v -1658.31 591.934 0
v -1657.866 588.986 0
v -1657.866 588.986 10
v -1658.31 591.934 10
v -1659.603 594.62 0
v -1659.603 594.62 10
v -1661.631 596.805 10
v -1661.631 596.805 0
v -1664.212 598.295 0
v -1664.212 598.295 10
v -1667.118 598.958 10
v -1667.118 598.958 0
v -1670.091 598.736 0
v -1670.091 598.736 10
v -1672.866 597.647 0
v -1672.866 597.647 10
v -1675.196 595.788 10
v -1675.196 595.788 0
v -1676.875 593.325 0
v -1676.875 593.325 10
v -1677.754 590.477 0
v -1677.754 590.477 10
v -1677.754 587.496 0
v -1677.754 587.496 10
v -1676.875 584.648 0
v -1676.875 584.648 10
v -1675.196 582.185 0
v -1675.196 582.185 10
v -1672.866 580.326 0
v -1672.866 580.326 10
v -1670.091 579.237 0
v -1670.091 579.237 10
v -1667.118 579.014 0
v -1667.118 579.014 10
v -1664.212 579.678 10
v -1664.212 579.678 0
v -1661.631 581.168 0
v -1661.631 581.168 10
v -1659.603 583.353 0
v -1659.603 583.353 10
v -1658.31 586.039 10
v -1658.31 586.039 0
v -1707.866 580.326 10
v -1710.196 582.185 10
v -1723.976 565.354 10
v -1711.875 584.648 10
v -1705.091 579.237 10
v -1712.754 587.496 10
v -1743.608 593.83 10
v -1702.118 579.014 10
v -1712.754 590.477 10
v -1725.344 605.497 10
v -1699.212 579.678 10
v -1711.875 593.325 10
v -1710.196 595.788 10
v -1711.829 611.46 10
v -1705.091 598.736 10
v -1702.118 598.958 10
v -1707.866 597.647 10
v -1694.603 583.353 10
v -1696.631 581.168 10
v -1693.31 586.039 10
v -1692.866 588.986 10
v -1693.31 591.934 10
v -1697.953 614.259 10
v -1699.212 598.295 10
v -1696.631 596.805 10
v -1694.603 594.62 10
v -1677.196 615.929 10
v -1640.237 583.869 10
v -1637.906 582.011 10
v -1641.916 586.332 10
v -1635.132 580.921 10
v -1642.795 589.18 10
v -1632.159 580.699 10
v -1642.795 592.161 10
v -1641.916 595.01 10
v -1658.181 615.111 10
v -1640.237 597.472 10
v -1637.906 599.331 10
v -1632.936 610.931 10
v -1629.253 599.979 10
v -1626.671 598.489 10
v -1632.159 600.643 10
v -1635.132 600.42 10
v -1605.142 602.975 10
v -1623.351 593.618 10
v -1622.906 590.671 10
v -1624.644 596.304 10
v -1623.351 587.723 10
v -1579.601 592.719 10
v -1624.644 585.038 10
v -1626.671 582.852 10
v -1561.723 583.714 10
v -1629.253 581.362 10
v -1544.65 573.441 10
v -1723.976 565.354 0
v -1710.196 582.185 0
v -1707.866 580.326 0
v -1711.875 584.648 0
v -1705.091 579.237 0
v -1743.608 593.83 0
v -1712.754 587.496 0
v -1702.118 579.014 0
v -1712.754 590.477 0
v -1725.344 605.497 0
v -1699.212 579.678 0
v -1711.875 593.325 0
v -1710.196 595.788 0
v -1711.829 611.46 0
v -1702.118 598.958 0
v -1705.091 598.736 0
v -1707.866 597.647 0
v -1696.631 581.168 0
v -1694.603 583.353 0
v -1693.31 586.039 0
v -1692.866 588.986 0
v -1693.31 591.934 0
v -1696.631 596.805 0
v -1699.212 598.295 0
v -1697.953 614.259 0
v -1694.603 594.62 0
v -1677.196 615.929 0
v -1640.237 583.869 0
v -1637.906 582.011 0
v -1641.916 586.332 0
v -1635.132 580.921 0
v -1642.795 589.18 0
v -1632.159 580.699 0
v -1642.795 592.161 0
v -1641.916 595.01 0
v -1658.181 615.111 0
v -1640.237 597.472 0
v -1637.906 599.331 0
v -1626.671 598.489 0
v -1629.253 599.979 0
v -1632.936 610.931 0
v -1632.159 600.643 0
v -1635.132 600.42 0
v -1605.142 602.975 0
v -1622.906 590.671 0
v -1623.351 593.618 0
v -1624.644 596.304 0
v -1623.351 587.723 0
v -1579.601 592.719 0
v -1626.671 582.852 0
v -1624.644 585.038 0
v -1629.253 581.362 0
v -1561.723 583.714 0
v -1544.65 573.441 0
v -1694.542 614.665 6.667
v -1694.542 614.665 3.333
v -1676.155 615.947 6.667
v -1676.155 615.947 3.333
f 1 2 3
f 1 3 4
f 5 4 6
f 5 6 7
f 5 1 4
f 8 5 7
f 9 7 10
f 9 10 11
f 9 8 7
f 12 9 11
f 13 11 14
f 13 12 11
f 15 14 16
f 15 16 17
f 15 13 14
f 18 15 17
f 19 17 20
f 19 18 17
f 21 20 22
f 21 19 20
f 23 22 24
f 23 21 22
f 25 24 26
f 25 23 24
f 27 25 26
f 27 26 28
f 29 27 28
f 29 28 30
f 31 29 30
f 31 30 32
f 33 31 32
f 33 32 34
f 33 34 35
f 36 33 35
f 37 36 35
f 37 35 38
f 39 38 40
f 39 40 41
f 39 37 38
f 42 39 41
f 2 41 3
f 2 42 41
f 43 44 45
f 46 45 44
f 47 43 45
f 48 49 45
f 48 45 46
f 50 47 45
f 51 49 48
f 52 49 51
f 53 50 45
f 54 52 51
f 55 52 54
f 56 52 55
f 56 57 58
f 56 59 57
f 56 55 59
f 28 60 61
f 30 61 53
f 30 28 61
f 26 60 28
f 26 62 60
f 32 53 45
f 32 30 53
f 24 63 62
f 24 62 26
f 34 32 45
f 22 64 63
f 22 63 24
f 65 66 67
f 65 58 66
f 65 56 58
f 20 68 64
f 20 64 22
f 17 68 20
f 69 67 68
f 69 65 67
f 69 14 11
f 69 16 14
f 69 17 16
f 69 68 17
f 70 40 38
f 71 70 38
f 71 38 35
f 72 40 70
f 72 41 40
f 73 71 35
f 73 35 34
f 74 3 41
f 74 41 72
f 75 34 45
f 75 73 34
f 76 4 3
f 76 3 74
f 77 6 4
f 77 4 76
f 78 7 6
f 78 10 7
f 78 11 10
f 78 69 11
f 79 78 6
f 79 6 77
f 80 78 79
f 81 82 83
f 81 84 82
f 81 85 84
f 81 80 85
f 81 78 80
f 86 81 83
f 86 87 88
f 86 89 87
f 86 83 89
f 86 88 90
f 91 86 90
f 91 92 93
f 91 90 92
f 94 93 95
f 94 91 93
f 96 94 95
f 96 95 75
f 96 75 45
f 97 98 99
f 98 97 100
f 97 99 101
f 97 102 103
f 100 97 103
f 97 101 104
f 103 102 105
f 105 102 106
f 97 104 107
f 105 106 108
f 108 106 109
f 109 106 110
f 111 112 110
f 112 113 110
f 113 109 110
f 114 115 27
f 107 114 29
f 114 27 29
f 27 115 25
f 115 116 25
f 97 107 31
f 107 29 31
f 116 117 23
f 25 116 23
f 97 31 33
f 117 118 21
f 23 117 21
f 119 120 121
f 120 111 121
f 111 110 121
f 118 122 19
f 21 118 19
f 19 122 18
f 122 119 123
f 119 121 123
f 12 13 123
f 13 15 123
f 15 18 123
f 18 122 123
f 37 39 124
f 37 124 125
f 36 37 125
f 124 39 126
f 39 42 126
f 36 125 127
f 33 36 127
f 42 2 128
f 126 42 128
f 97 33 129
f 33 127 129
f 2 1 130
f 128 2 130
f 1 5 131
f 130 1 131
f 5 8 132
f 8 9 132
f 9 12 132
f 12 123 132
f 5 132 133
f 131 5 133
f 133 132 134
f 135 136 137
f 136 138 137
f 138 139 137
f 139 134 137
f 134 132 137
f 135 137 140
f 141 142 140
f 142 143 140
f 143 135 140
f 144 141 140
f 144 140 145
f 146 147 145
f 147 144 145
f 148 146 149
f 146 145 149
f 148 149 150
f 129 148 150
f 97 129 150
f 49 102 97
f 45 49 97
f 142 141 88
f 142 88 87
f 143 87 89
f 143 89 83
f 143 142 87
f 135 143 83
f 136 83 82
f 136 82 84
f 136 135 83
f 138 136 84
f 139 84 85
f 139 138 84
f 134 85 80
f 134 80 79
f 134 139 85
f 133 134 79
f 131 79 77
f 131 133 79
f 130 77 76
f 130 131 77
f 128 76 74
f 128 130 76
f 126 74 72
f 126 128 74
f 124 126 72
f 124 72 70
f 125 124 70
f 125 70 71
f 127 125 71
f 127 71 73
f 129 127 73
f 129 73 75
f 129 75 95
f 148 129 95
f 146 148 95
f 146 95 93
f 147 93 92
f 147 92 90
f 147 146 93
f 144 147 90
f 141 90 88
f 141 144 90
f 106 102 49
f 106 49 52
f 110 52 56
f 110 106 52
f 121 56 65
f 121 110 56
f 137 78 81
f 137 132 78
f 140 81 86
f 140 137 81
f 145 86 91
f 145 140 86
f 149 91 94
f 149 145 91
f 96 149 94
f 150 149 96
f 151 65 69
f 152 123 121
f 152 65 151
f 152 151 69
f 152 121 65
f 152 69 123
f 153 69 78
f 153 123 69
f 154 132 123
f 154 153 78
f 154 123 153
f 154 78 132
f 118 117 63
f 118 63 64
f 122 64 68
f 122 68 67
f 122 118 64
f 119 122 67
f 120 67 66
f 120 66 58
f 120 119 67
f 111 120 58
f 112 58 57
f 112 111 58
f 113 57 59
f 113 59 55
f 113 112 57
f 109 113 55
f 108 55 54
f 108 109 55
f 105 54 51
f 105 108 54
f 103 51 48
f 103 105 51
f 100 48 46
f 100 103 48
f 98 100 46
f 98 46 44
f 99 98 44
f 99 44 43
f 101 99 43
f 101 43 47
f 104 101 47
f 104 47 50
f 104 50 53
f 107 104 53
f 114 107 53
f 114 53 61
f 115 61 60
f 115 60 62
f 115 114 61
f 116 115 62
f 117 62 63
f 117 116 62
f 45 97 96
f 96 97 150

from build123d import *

# Parameters (mm, degrees)
SKETCH1_R           = 10
BOSS_EXTRUDE1_DEPTH = 10


with BuildPart() as part:
    # Sketch1 → Boss-Extrude1 (new body)
    with BuildSketch(Plane.XY):
        with BuildLine():
            Line((-1743.607960183, 593.830470178), (-1723.97557604, 565.354199265))
            Line((-1723.97557604, 565.354199265), (-1544.649956659, 573.44143308))
            add(Edge.make_bspline(
                [(-1743.607960183, 593.830470178), (-1719.507904213, 610.537812828), (-1709.389541143, 613.399774739), (-1646.280289738, 619.241808081), (-1585.716648888, 600.423930323), (-1544.649956659, 573.44143308)],
                knots=[0, 0, 0, 0, 0.320554642, 0.420554642, 1, 1, 1, 1], degree=3))
        make_face()
        with Locations((-1632.906290904, 590.670757295)):
            Circle(SKETCH1_R, mode=Mode.SUBTRACT)
        with Locations((-1667.865738011, 588.986400452)):
            Circle(SKETCH1_R, mode=Mode.SUBTRACT)
        with Locations((-1702.865738011, 588.986400452)):
            Circle(SKETCH1_R, mode=Mode.SUBTRACT)
    extrude(amount=BOSS_EXTRUDE1_DEPTH)


solid = part.part
